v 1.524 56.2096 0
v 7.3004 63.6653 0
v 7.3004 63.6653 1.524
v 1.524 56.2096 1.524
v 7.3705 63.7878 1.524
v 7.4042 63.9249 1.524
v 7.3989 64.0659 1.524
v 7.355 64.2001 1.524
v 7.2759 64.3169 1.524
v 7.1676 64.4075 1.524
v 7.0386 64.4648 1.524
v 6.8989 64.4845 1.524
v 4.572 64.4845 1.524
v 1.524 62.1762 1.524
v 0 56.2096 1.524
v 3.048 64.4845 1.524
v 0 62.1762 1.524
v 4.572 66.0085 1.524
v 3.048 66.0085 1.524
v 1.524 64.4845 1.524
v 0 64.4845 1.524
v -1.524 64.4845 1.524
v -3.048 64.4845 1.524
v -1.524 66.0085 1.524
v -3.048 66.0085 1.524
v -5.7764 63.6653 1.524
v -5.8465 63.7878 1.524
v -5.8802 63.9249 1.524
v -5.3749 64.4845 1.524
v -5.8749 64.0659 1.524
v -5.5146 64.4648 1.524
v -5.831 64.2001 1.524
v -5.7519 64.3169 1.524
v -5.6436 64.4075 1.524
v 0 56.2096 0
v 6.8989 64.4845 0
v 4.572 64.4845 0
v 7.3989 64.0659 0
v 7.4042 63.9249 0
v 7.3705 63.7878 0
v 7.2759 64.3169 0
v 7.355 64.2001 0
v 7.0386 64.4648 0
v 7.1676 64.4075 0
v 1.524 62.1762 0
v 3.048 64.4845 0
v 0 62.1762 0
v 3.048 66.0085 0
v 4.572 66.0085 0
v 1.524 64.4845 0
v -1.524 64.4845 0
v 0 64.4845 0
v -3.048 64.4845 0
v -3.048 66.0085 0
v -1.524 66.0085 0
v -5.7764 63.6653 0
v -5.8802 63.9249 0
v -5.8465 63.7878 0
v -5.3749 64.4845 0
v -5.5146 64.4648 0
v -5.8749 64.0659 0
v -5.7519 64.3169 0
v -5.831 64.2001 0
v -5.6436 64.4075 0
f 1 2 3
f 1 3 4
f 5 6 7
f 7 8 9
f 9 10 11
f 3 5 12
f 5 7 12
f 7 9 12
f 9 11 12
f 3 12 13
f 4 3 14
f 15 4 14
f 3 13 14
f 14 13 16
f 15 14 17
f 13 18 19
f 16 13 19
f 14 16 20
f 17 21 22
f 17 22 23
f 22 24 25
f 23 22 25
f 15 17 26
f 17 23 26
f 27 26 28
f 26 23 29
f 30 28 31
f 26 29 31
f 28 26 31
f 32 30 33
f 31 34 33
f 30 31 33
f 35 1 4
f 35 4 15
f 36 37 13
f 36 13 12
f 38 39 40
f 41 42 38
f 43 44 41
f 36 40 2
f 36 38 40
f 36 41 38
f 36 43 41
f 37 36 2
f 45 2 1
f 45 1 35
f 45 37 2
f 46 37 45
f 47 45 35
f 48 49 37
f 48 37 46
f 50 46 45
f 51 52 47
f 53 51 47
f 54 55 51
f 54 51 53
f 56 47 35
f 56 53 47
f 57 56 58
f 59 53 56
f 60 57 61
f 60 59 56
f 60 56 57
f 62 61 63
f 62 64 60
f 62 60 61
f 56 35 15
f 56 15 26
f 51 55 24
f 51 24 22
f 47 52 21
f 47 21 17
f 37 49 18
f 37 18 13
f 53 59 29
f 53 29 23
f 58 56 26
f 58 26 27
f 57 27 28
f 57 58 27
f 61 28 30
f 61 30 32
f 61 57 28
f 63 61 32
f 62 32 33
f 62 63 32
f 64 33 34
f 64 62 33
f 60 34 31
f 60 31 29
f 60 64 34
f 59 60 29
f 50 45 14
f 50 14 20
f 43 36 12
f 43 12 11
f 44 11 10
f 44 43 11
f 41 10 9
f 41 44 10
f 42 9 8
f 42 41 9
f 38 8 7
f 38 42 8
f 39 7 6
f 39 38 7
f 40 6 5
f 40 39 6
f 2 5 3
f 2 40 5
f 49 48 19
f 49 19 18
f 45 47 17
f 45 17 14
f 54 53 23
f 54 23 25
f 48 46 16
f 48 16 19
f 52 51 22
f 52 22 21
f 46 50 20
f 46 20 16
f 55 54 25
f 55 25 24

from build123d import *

# Parameters (mm, degrees)
BOSS_EXTRUDE1_DEPTH = 1.524


with BuildPart() as part:
    # Sketch1 → Boss-Extrude1 (new body)
    with BuildSketch(Plane.XY):
        with BuildLine():
            Line((1.524, 62.176210227), (1.524, 64.48445576))
            Line((1.524, 64.48445576), (3.048, 64.48445576))
            Line((3.048, 64.48445576), (3.048, 66.00845576))
            Line((3.048, 66.00845576), (4.572, 66.00845576))
            Line((4.572, 66.00845576), (4.572, 64.48445576))
            Line((4.572, 64.48445576), (6.898856883, 64.48445576))
            ThreePointArc((6.898856883, 64.48445576), (7.354991053, 64.200075123), (7.300433388, 63.665328277))
            Line((7.300433388, 63.665328277), (1.524, 56.209606557))
            Line((1.524, 56.209606557), (0, 56.209606557))
            Line((0, 56.209606557), (-5.776433388, 63.665328277))
            ThreePointArc((-5.776433388, 63.665328277), (-5.830991053, 64.200075123), (-5.374856883, 64.48445576))
            Line((-5.374856883, 64.48445576), (-3.048, 64.48445576))
            Line((-3.048, 64.48445576), (-3.048, 66.00845576))
            Line((-3.048, 66.00845576), (-1.524, 66.00845576))
            Line((-1.524, 66.00845576), (-1.524, 64.48445576))
            Line((-1.524, 64.48445576), (0, 64.48445576))
            Line((0, 64.48445576), (0, 62.176210227))
            Line((0, 62.176210227), (1.524, 62.176210227))
        make_face()
    extrude(amount=BOSS_EXTRUDE1_DEPTH)


solid = part.part
